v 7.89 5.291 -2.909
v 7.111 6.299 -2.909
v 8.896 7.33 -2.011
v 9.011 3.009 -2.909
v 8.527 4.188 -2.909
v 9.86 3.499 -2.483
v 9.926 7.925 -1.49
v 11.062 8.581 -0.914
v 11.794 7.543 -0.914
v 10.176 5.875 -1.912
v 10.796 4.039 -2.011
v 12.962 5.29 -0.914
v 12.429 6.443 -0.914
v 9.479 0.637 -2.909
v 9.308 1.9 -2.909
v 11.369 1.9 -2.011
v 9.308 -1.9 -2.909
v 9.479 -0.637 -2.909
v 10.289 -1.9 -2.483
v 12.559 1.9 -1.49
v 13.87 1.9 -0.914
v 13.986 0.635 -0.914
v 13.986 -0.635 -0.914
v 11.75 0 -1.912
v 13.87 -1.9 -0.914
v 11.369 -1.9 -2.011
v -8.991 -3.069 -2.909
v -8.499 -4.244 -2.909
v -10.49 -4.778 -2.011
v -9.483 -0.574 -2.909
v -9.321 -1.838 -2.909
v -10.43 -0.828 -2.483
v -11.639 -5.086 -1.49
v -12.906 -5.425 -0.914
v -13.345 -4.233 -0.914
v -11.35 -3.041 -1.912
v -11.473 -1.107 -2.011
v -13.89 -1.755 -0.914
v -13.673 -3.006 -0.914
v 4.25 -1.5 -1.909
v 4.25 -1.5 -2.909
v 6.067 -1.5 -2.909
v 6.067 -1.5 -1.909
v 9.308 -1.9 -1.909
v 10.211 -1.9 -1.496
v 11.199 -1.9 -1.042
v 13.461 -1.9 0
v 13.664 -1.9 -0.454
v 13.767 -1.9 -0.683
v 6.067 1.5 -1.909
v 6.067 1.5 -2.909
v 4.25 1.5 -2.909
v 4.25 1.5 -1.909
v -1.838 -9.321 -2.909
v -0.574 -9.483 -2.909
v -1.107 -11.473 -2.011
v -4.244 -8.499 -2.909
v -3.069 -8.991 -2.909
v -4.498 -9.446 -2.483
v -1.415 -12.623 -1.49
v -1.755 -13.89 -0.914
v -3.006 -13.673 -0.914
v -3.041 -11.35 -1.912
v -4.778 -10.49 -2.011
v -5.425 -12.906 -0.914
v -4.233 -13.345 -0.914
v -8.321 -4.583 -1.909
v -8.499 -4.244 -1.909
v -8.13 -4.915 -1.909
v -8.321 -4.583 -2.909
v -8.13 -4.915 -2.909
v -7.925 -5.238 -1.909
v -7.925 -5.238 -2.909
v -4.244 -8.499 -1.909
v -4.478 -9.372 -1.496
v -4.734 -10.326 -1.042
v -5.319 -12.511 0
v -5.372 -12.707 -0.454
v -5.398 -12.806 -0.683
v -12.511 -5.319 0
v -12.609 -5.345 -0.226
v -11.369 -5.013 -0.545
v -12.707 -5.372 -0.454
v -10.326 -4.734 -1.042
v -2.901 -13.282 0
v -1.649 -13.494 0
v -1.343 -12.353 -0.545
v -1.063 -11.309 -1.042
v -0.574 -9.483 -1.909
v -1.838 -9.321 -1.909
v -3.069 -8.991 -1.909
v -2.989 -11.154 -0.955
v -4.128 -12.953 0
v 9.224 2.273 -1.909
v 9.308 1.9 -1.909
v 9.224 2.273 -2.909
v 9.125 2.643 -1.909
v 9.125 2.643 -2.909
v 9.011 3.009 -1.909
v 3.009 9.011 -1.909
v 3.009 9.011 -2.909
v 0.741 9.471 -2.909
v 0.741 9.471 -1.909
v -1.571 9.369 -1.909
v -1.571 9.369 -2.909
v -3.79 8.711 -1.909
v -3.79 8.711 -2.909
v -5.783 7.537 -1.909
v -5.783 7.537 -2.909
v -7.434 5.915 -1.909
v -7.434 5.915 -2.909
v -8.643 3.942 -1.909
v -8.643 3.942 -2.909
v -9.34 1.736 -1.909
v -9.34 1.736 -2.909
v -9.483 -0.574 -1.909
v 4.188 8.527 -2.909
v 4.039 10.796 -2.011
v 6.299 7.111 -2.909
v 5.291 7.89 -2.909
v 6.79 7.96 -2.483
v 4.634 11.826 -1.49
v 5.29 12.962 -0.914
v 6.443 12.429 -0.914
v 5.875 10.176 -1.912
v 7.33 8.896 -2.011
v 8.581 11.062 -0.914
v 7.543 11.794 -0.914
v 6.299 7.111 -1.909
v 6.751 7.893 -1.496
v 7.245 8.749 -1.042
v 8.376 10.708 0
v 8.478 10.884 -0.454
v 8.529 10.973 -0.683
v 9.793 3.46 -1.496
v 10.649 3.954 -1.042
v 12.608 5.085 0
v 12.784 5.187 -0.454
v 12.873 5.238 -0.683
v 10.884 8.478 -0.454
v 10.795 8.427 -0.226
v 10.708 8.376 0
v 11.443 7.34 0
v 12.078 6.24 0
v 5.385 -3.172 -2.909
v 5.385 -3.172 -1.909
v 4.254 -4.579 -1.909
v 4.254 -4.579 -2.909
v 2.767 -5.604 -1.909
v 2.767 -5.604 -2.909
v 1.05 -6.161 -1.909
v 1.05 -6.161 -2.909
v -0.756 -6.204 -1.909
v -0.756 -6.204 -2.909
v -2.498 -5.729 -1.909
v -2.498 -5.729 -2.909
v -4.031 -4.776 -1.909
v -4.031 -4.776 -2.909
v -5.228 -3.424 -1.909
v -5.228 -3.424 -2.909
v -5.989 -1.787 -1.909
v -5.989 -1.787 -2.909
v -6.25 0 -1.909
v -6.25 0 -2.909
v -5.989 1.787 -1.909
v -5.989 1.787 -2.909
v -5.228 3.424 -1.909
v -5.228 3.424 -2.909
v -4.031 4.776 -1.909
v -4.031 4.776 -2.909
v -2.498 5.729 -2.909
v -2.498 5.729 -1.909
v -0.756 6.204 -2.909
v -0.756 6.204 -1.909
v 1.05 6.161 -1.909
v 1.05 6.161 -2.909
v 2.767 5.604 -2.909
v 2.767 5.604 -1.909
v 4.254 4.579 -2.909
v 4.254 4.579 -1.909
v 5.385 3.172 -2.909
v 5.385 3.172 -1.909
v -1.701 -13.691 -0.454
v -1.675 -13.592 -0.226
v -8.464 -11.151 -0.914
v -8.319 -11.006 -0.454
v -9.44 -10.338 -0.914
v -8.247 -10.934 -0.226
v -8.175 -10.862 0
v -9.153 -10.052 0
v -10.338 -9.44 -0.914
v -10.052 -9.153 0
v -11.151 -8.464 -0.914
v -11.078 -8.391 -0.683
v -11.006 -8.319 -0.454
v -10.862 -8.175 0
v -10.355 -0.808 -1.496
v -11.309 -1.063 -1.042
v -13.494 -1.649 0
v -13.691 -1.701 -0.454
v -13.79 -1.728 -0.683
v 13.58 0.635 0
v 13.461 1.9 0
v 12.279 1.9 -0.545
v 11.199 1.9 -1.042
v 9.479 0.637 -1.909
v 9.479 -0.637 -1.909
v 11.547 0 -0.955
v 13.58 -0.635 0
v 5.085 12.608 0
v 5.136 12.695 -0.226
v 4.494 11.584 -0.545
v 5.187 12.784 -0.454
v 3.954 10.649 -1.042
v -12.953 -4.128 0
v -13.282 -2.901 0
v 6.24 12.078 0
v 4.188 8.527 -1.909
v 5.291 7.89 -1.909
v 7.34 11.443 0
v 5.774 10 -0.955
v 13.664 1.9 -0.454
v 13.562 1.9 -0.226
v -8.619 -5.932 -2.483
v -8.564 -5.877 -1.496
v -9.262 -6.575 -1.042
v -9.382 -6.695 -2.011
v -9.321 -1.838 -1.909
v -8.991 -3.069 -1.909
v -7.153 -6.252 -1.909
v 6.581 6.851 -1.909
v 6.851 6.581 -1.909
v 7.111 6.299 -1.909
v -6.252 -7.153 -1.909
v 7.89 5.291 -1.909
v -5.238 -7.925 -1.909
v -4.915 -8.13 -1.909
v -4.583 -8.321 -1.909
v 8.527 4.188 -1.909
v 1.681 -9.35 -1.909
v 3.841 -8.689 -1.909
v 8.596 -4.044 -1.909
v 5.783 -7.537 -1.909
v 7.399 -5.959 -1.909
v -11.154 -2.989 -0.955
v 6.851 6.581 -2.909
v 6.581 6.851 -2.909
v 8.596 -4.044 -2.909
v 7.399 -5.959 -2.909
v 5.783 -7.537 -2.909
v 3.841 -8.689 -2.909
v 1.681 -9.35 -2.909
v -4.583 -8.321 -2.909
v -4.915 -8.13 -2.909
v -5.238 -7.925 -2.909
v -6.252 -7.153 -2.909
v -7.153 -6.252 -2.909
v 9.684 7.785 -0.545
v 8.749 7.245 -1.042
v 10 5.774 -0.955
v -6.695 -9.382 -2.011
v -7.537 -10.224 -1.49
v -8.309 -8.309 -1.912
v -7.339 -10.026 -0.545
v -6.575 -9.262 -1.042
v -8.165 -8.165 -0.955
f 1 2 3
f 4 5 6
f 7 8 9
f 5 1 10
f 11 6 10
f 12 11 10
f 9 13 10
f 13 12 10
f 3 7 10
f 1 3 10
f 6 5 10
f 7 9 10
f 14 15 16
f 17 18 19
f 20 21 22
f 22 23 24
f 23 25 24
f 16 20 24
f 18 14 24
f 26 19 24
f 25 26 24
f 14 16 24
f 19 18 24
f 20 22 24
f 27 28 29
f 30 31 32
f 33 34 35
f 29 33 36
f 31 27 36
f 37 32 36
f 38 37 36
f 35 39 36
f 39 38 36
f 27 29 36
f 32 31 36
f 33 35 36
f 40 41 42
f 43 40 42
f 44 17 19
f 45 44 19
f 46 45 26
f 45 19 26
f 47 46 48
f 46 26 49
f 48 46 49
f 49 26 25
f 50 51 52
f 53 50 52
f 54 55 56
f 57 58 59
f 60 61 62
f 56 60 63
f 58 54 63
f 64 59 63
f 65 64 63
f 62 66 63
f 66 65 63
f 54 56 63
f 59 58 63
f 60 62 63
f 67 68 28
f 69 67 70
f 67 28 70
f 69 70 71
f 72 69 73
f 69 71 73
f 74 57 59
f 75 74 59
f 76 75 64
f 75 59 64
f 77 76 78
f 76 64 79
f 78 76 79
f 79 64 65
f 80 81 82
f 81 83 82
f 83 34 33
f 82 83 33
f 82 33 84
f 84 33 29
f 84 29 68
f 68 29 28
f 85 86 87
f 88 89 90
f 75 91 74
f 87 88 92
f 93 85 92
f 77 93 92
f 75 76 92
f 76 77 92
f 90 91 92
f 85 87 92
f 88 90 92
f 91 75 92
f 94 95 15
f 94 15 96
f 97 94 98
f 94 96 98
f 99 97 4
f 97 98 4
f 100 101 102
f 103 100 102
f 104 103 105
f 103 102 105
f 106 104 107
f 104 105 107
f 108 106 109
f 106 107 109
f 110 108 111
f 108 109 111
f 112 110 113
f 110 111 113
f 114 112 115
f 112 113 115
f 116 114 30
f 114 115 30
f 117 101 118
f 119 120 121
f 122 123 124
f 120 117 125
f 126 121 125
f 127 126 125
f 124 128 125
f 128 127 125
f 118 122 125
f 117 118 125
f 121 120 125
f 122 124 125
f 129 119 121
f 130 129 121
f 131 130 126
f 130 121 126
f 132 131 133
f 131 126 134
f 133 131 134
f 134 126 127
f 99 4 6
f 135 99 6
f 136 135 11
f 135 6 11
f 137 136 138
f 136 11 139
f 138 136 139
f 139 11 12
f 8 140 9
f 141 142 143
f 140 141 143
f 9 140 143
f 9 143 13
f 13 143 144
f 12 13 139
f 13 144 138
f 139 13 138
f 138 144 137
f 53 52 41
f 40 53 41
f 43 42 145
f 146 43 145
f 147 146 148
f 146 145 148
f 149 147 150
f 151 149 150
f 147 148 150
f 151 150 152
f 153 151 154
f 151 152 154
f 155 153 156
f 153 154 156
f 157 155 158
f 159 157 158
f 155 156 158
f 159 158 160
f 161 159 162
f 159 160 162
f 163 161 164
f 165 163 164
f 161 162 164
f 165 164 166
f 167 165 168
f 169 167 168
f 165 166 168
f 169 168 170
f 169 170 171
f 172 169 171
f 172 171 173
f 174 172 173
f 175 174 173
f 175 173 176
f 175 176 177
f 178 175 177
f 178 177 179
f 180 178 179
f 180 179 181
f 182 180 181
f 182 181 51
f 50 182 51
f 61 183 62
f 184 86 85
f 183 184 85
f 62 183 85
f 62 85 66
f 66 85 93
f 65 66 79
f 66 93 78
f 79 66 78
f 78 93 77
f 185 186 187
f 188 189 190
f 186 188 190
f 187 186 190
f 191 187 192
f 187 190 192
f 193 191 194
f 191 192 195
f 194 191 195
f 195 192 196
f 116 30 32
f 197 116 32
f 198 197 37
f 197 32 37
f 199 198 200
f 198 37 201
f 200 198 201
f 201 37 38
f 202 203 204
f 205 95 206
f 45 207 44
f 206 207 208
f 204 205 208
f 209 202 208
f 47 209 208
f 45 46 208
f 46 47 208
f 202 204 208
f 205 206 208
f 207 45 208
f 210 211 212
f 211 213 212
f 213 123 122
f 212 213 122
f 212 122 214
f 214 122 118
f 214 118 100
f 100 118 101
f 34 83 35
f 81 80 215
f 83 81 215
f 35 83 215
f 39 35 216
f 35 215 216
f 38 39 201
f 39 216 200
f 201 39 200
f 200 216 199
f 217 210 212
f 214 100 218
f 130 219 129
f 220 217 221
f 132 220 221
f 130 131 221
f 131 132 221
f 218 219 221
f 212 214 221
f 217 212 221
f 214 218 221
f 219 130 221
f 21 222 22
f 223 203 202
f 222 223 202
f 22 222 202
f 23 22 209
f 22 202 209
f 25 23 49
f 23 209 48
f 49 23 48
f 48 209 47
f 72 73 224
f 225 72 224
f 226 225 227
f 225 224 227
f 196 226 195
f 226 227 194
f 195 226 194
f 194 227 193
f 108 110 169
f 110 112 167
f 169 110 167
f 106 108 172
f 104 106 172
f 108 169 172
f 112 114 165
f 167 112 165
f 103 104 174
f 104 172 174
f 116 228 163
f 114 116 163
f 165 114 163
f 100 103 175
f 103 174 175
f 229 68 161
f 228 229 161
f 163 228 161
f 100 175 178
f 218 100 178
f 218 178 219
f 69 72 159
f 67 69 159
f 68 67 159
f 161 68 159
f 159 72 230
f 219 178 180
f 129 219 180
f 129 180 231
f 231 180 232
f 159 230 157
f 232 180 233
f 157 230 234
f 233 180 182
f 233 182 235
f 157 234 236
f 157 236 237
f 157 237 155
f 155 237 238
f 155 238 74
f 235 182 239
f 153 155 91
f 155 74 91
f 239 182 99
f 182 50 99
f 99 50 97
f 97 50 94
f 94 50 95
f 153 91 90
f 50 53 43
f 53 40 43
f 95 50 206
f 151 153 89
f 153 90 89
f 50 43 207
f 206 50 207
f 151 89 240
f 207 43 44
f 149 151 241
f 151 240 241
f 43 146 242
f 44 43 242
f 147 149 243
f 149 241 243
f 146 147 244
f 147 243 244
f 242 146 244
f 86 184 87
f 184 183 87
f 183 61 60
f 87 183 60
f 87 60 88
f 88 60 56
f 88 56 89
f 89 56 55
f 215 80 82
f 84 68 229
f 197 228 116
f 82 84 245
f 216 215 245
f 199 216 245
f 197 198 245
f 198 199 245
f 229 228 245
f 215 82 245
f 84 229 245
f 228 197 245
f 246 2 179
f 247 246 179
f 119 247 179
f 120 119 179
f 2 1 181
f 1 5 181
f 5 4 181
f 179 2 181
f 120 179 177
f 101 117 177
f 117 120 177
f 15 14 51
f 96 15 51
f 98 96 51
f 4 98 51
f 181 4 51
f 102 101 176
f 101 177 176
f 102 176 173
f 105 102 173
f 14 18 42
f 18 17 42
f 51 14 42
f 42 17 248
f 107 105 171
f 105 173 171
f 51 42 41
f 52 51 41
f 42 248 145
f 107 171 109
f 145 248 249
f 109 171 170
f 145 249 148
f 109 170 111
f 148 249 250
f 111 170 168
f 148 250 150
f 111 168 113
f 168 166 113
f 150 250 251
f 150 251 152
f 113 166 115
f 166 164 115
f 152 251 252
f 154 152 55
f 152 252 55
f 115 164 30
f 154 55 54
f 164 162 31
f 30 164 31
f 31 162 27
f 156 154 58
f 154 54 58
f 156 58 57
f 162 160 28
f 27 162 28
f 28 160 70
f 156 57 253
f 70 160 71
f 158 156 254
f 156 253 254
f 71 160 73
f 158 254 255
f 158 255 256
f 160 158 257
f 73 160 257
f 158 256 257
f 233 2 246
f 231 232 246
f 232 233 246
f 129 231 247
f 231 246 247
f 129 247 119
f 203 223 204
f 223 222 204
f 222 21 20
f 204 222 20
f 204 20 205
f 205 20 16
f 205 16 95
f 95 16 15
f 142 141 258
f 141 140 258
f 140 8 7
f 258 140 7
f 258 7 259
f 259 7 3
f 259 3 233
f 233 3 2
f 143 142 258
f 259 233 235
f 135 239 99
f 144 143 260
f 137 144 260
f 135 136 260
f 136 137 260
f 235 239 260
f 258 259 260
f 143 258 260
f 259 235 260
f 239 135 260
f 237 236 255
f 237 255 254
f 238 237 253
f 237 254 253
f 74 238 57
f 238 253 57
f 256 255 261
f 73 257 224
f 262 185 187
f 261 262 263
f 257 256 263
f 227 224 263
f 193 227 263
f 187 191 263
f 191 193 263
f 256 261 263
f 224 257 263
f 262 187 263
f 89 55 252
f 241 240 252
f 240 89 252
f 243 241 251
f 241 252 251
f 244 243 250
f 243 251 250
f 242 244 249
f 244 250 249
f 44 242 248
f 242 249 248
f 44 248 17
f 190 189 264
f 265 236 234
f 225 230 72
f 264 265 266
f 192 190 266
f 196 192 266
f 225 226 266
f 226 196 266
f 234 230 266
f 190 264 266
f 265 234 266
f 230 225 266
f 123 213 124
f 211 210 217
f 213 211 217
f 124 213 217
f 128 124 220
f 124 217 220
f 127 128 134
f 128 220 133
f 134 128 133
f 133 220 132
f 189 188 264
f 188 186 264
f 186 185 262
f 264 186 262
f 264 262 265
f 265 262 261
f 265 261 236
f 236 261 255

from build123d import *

# Parameters (mm, degrees)
SKETCH2_OUTSIDE_W = 37.94
SKETCH2_OUTSIDE_H = 37.94
CUT_EXTRUDE_DEPTH = 23.420400339


with BuildPart() as part:
    # Sketch1 → Base-Extrude (revolve)
    with BuildSketch(Plane.YZ, mode=Mode.PRIVATE) as base_extrude_sk:
        Polygon((0, -2.909378314), (-9.5, -2.909378314), (-14, -0.91417266), (-13.594675009, 0), (-9.5, -1.909378314), (0, -1.909378314), align=None)
    revolve(base_extrude_sk.sketch.rotate(Axis((0, 0, 5.823648763), (0, 0, -1)), 270), axis=Axis((0, 0, 5.823648763), (0, 0, -1)))

    # Sketch2 outside → Cut-Extrude (cut, through all)
    # profile 1 of 2: a face of its own
    with BuildSketch(Plane(origin=(-2.40435344, 1.003568156, -2.909378314), x_dir=(-1, 0, 0), z_dir=(0, 0, -1))):
        with Locations((-2.404, -1.004)):
            Rectangle(SKETCH2_OUTSIDE_W, SKETCH2_OUTSIDE_H)
        with BuildLine():
            Line((-11.712414462, -2.903568156), (-16.274825674, -2.903568156))
            ThreePointArc((-16.274825674, -2.903568156), (-16.40435344, -1.003568156), (-16.274825674, 0.896431844))
            Line((-16.274825674, 0.896431844), (-11.712414462, 0.896431844))
            ThreePointArc((-11.712414462, 0.896431844), (-11.580648789, 1.455212772), (-11.415370745, 2.005014088))
            Line((-11.415370745, 2.005014088), (-15.366534757, 4.286219694))
            ThreePointArc((-15.366534757, 4.286219694), (-14.528709093, 5.996431844), (-13.466534757, 7.577116228))
            Line((-13.466534757, 7.577116228), (-9.515370745, 5.295910622))
            ThreePointArc((-9.515370745, 5.295910622), (-9.121867861, 5.713946265), (-8.703832218, 6.107449149))
            Line((-8.703832218, 6.107449149), (-10.985037824, 10.058613161))
            ThreePointArc((-10.985037824, 10.058613161), (-9.40435344, 11.120787497), (-7.69414129, 11.958613161))
            Line((-7.69414129, 11.958613161), (-5.412935684, 8.007449149))
            ThreePointArc((-5.412935684, 8.007449149), (3.378880136, 6.533288576), (7.07829928, -1.577412552))
            Line((7.07829928, -1.577412552), (11.4852501, -2.758251465))
            ThreePointArc((11.4852501, -2.758251465), (11.118608128, -4.627034788), (10.501737729, -6.428769605))
            Line((10.501737729, -6.428769605), (6.094786909, -5.247930692))
            ThreePointArc((6.094786909, -5.247930692), (5.822887896, -5.753568156), (5.520942513, -6.241858341))
            Line((5.520942513, -6.241858341), (8.74705442, -9.467970247))
            ThreePointArc((8.74705442, -9.467970247), (7.495141497, -10.903063093), (6.060048651, -12.154976016))
            Line((6.060048651, -12.154976016), (2.833936745, -8.928864109))
            ThreePointArc((2.833936745, -8.928864109), (2.34564656, -9.230809492), (1.840009096, -9.502708505))
            Line((1.840009096, -9.502708505), (3.020848009, -13.909659325))
            ThreePointArc((3.020848009, -13.909659325), (1.219113192, -14.526529724), (-0.649670131, -14.893171696))
            Line((-0.649670131, -14.893171696), (-1.830509044, -10.486220876))
            ThreePointArc((-1.830509044, -10.486220876), (-8.187587015, -8.540424889), (-11.712414462, -2.903568156))
        make_face(mode=Mode.SUBTRACT)
    # profile 2 of 2: a face of its own
    with BuildSketch(Plane(origin=(-2.40435344, 1.003568156, -2.909378314), x_dir=(-1, 0, 0), z_dir=(0, 0, -1))):
        with BuildLine():
            Line((-8.471683989, 0.496431844), (-6.65435344, 0.496431844))
            Line((-6.65435344, 0.496431844), (-6.65435344, -2.503568156))
            Line((-6.65435344, -2.503568156), (-8.471683989, -2.503568156))
            ThreePointArc((-8.471683989, -2.503568156), (3.84564656, -1.003568156), (-8.471683989, 0.496431844))
        make_face()
    extrude(amount=-CUT_EXTRUDE_DEPTH, mode=Mode.SUBTRACT)


solid = part.part
